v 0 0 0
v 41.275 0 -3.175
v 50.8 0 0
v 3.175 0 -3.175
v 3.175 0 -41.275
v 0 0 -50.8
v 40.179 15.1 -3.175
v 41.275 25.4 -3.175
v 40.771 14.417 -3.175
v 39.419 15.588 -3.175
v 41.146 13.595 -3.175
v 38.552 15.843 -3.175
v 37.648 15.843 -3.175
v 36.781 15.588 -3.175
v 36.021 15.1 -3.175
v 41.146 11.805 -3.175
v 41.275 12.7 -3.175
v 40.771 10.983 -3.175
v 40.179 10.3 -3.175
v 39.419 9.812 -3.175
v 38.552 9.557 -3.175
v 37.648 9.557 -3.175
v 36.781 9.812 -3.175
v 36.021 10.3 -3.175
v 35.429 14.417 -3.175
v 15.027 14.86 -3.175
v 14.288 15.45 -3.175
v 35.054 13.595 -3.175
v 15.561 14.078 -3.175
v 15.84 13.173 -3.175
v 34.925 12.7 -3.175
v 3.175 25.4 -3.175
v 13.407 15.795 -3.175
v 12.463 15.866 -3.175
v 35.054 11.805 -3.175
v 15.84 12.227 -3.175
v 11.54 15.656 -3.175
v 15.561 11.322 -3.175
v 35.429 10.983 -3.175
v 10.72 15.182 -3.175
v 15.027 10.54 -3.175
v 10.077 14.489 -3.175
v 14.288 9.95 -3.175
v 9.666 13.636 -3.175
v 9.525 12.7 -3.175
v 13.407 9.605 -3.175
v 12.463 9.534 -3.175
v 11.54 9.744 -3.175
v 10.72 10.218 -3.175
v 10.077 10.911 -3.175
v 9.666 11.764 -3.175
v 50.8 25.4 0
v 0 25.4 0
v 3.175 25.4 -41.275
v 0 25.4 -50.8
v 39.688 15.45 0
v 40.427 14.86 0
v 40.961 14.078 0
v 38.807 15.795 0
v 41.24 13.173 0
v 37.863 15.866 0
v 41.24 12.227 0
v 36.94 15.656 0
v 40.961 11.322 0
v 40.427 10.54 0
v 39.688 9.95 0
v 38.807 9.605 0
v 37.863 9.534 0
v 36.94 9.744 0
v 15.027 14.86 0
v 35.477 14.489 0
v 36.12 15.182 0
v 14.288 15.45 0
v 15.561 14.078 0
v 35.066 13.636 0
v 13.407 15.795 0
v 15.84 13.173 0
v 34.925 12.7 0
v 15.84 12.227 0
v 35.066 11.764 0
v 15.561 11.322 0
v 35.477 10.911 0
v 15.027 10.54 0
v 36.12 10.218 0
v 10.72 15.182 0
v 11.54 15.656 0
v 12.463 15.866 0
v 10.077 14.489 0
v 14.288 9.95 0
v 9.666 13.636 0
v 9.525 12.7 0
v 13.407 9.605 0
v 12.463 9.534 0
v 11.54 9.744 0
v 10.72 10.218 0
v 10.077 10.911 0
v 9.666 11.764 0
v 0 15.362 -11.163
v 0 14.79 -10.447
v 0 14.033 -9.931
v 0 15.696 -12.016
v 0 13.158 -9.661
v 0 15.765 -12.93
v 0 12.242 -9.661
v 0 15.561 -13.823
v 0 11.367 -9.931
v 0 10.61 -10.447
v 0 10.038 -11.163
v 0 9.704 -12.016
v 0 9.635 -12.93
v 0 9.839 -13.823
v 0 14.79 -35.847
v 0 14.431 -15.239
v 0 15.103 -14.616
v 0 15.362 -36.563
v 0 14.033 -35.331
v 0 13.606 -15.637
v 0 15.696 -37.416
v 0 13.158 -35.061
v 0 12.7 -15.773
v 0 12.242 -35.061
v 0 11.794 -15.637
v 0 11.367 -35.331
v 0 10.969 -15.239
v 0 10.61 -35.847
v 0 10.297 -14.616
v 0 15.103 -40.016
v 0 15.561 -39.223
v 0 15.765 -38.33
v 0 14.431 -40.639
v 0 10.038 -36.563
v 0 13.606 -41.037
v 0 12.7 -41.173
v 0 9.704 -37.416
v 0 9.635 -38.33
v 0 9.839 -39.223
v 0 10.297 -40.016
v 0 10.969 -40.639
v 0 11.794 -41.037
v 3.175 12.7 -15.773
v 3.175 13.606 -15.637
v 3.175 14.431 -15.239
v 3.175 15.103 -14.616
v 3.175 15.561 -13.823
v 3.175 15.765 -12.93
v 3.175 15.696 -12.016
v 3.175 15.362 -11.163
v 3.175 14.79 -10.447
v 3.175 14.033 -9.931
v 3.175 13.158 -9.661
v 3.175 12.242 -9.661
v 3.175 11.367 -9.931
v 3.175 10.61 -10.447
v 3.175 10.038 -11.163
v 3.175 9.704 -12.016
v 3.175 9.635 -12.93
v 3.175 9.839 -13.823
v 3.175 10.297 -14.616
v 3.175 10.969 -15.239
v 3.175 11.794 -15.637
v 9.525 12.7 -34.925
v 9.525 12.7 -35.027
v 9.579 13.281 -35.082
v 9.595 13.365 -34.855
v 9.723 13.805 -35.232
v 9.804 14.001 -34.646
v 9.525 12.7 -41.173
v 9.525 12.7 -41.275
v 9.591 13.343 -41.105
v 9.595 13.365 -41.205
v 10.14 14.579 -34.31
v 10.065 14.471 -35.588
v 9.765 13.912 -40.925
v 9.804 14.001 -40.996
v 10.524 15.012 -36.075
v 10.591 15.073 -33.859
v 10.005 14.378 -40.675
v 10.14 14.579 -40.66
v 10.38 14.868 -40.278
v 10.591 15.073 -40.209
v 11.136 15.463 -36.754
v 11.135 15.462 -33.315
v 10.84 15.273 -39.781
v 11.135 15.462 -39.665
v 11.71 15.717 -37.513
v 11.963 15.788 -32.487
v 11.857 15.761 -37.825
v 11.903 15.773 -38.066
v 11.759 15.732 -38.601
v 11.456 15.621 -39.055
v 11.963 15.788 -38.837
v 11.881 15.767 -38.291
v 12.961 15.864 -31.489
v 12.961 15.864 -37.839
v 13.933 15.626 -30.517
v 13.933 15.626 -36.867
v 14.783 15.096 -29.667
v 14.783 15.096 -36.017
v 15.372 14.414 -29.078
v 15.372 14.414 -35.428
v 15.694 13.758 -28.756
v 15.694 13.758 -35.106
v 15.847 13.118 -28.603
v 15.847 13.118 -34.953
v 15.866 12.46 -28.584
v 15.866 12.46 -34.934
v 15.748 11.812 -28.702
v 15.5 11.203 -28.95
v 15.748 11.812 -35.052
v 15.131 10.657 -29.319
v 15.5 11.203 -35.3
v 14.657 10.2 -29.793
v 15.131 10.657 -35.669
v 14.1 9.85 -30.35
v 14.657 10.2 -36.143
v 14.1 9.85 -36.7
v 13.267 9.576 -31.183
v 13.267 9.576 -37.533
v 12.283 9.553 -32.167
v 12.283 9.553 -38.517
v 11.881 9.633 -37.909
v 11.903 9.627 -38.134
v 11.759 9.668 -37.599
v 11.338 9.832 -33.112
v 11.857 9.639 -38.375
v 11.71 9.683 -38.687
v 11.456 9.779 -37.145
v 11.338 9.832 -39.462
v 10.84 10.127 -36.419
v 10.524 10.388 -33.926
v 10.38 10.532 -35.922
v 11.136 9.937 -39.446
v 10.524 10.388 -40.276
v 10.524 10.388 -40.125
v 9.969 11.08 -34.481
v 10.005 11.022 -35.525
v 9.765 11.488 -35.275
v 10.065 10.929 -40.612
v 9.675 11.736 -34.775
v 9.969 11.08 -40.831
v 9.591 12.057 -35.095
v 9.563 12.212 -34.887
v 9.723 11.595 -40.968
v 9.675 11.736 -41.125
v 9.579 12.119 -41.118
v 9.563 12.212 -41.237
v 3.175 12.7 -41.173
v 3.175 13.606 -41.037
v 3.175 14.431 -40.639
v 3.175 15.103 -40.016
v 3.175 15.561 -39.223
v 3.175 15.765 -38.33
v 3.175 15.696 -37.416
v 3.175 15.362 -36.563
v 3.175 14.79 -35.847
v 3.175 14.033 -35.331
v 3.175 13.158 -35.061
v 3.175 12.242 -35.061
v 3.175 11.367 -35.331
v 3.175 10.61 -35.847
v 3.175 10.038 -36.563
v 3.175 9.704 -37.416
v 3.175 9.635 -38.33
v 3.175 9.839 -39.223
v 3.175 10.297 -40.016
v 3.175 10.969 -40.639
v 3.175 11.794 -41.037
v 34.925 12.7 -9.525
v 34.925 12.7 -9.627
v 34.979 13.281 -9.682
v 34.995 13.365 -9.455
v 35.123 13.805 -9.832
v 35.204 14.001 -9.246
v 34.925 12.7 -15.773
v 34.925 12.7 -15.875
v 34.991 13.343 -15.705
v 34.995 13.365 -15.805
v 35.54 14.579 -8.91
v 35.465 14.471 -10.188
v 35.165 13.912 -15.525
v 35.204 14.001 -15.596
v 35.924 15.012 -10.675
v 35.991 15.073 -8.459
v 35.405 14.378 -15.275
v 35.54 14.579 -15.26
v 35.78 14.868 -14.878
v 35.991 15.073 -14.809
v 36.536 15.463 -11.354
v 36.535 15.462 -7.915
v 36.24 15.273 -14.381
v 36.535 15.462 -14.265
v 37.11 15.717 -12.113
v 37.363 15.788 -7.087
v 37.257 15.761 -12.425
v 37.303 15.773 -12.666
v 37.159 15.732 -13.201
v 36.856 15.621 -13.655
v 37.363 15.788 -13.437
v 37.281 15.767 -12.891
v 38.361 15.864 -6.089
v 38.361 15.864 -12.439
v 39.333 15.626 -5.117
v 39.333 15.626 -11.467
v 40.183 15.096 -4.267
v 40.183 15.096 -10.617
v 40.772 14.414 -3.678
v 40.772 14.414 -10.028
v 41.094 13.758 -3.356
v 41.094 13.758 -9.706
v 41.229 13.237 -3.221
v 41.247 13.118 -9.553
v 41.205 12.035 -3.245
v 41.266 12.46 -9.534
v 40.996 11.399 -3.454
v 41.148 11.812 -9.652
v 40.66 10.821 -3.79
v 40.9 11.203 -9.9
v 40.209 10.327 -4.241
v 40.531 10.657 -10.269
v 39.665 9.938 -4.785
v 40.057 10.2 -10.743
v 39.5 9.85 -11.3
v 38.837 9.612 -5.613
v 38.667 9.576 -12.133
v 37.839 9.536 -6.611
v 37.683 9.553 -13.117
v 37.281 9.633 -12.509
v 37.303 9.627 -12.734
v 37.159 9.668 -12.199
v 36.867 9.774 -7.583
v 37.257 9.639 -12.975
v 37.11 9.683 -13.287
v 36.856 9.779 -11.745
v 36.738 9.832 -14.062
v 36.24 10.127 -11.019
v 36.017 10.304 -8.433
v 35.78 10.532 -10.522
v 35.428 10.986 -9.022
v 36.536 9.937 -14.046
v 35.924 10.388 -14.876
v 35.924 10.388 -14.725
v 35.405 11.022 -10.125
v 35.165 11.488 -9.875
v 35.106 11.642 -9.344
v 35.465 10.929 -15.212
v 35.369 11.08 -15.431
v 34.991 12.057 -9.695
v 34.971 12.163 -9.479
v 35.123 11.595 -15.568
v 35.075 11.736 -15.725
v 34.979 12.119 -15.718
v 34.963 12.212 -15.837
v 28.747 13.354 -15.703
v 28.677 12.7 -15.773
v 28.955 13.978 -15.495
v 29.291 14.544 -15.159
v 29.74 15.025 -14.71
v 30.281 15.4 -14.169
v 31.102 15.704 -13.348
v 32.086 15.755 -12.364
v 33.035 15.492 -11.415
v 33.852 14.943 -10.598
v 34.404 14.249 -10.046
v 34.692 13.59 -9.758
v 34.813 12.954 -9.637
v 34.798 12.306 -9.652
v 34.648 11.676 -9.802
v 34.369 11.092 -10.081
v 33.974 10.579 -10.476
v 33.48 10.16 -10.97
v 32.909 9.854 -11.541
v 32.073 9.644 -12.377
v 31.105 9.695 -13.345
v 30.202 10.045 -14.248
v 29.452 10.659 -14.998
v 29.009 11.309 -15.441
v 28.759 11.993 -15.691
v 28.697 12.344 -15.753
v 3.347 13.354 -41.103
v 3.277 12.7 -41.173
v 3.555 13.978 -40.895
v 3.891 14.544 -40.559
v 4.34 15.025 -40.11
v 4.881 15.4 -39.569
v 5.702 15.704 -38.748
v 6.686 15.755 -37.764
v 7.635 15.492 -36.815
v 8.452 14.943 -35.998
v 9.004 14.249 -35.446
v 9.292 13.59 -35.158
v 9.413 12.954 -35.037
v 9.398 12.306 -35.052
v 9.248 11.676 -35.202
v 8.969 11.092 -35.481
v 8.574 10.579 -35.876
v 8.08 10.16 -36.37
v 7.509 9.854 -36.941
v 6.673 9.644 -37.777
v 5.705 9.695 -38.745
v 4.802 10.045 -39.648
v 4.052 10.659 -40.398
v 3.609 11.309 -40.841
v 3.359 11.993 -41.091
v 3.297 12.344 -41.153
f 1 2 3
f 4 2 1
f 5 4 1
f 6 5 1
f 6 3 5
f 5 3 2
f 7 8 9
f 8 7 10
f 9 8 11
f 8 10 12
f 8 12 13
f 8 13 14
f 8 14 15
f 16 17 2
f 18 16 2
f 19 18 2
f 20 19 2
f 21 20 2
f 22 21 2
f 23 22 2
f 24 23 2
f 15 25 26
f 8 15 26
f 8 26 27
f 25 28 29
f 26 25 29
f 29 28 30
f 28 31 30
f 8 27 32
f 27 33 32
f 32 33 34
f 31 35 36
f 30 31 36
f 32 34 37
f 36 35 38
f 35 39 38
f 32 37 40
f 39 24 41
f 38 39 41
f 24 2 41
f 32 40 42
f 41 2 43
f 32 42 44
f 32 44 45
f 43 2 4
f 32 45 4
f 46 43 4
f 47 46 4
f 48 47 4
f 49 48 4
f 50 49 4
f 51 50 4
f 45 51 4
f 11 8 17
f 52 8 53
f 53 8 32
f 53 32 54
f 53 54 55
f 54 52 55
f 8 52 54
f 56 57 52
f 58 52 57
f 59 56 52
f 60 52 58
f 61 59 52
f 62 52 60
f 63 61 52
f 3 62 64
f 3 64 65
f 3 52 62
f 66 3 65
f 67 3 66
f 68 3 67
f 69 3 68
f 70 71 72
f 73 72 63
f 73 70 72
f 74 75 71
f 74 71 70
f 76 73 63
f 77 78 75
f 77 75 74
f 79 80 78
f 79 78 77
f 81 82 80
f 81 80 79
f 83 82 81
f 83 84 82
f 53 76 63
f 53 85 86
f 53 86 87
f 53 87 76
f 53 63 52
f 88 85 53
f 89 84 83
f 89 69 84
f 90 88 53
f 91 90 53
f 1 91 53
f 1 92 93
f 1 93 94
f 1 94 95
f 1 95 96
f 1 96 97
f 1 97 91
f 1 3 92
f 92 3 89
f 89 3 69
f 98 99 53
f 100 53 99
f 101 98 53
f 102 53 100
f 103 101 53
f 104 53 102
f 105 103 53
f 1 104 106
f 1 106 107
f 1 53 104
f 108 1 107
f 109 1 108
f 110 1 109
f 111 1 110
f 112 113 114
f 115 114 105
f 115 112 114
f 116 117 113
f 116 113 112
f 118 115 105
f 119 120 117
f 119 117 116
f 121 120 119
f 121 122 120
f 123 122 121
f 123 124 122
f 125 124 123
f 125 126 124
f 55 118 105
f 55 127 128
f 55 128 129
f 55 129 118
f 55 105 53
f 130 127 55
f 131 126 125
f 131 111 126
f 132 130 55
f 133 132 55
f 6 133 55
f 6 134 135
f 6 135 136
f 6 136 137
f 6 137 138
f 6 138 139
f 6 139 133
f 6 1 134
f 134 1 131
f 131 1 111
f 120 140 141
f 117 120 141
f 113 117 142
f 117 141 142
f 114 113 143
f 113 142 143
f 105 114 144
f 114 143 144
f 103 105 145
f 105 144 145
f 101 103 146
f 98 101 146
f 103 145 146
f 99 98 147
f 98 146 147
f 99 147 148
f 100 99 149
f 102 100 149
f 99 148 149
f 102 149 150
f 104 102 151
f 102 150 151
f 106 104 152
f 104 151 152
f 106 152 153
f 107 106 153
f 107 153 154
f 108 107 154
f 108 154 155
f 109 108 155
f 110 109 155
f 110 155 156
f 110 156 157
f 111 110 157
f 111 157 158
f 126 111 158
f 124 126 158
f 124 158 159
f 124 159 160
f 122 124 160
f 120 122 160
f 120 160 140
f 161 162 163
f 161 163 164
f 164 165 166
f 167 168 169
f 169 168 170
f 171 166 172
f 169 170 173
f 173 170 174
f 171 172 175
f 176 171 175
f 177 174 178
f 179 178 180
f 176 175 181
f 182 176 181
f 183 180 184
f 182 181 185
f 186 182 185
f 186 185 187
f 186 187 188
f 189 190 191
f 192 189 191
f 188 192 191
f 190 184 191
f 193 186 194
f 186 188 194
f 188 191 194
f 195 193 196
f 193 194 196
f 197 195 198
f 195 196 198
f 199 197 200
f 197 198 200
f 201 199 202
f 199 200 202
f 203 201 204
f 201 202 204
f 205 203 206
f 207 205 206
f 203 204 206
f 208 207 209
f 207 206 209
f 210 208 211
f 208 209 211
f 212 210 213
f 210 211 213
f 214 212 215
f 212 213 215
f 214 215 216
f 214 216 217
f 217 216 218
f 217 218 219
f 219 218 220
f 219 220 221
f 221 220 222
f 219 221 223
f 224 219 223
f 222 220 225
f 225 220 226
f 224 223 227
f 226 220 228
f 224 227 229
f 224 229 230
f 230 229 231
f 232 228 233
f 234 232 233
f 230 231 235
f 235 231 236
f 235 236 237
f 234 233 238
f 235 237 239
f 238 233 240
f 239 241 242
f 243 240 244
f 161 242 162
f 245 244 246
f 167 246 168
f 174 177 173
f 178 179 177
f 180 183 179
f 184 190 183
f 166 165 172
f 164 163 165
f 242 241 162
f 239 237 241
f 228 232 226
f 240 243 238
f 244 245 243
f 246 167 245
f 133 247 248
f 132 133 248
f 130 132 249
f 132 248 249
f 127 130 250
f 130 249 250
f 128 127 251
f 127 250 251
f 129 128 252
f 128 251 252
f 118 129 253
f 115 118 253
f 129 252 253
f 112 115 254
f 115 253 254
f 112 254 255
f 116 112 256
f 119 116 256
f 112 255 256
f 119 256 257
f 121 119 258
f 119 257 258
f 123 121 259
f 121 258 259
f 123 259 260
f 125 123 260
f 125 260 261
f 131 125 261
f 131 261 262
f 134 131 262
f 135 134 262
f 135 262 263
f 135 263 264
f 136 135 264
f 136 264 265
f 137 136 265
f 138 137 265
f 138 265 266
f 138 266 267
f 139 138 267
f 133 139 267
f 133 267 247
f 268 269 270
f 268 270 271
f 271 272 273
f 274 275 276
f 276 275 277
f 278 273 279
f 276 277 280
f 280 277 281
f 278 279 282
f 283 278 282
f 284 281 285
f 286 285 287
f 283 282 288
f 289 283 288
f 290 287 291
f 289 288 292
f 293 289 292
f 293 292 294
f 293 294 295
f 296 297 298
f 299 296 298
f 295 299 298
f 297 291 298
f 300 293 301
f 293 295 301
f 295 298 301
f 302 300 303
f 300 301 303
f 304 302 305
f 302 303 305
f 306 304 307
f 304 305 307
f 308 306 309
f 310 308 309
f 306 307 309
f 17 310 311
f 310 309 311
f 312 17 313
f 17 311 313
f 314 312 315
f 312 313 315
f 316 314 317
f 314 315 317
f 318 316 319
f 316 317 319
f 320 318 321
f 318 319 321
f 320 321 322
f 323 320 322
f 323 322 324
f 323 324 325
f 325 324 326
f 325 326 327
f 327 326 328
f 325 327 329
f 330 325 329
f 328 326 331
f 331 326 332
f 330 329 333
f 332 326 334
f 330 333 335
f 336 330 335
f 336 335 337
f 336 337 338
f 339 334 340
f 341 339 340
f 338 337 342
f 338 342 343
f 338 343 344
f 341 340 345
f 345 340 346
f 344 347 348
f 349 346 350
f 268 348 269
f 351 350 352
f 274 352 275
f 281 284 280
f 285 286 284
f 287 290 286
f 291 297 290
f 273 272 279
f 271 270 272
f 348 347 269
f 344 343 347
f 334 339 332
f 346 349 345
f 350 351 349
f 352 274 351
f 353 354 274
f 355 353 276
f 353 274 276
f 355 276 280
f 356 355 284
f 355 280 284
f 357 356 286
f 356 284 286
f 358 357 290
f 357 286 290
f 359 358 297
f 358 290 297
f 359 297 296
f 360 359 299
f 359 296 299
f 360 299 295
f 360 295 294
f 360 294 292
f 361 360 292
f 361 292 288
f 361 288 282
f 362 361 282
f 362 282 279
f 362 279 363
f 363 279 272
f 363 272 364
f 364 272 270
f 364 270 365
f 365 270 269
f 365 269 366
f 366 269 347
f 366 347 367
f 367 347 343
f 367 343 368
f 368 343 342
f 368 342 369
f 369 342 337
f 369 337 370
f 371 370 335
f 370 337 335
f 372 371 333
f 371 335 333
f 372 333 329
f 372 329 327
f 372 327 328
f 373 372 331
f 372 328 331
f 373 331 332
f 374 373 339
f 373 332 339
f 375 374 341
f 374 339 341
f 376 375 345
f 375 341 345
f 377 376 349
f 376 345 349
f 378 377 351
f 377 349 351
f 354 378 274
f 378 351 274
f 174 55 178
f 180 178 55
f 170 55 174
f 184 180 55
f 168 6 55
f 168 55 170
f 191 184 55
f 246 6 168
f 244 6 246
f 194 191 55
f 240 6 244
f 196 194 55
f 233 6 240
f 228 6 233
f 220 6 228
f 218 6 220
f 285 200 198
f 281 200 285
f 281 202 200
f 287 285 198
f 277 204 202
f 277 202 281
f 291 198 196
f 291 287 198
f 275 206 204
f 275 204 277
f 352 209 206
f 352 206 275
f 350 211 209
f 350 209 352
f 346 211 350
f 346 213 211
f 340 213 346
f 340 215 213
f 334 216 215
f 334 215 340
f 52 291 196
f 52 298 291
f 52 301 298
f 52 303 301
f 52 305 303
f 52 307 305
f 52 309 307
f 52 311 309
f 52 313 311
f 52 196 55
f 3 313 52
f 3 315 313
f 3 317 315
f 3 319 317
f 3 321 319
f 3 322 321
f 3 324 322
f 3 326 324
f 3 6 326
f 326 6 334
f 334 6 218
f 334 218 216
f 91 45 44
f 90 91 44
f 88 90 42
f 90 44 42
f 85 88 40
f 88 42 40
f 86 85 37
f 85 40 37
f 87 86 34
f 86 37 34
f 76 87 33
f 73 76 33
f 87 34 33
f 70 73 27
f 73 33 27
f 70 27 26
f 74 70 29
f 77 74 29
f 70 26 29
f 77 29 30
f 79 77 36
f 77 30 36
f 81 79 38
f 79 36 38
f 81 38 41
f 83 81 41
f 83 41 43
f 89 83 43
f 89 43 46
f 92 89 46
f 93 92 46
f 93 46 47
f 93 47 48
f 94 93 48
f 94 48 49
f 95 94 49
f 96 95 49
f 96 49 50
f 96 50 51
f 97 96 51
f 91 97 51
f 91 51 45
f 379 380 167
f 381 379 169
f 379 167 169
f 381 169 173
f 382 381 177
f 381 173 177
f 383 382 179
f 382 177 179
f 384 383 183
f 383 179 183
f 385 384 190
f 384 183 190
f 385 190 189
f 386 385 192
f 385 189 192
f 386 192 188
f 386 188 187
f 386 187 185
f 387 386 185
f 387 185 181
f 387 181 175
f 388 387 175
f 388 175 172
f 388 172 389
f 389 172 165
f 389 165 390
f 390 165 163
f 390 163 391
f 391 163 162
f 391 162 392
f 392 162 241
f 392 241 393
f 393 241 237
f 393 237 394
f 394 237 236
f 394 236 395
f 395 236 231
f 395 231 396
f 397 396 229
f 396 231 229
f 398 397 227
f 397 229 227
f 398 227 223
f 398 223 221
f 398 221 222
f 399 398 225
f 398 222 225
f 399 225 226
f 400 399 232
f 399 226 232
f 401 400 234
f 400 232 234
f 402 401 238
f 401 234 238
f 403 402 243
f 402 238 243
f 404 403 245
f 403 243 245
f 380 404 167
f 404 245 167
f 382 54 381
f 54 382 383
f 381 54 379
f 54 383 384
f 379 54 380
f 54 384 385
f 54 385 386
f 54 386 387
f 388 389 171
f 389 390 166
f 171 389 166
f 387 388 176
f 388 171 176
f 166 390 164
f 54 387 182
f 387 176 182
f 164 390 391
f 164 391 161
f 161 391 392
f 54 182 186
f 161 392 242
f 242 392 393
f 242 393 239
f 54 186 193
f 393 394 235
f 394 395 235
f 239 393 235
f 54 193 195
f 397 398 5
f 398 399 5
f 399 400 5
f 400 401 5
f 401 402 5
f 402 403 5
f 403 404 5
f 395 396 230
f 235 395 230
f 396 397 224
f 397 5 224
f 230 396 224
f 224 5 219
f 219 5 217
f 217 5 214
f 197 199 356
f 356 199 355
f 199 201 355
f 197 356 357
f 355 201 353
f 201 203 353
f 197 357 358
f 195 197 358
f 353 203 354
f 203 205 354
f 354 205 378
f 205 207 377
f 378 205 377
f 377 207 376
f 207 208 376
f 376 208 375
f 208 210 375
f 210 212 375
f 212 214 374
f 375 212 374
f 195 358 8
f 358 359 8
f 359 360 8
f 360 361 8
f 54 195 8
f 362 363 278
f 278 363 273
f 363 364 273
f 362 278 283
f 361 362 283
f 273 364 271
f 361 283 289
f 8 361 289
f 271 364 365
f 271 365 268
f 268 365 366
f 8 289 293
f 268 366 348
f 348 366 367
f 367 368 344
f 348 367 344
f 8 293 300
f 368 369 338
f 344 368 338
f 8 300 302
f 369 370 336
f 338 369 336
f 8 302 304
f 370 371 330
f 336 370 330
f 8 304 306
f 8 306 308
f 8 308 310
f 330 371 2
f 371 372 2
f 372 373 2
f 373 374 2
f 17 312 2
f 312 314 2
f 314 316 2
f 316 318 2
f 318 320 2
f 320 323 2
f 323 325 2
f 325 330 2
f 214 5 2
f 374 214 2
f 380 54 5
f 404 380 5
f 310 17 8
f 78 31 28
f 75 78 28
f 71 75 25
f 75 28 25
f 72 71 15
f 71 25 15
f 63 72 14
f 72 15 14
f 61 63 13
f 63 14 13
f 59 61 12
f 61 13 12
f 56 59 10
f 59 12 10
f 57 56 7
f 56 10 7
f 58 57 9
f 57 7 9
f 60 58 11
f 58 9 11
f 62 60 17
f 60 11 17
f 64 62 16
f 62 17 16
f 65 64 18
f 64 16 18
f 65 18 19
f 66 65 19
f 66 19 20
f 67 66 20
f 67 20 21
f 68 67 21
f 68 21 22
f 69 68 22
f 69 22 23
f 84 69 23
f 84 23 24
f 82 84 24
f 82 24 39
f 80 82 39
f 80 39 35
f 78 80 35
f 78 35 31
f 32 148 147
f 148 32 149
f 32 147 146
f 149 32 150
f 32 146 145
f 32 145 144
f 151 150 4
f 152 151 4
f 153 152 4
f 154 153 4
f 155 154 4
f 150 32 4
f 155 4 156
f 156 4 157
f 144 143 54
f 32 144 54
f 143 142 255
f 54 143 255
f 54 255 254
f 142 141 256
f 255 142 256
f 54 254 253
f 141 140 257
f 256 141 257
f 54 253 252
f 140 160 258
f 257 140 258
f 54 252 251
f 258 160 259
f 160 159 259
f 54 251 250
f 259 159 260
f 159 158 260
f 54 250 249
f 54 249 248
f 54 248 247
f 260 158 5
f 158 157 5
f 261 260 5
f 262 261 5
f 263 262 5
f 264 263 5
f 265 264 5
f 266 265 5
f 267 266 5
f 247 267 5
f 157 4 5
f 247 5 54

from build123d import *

# Parameters (mm, degrees)
BOSS_EXTRUDE1_DEPTH         = 25.4
C_0_242_DIAMETER_HOLE1_D    = 6.1468
F_1_4_0_25_DIAMETER_HOLE1_D = 6.35


with BuildPart() as part:
    # Sketch1 → Boss-Extrude1 (new body)
    with BuildSketch(Plane(origin=(0, 0, 0), x_dir=(1, 0, 0), z_dir=(0, 1, 0))):
        Polygon((0, 0), (0, 50.8), (50.8, 0), align=None)
        Polygon((3.175, 3.175), (3.175, 41.275), (41.275, 3.175), align=None, mode=Mode.SUBTRACT)
    extrude(amount=BOSS_EXTRUDE1_DEPTH)

    # C (0.242) Diameter Hole1 (through all)
    with Locations(Plane.ZY):
        with Locations((-12.7, 12.7), (-38.1, 12.7)):
            Hole(C_0_242_DIAMETER_HOLE1_D / 2)

    # 1/4 (0.25) Diameter Hole1 (through all)
    with Locations(Plane.XY):
        with Locations((38.1, 12.7), (12.7, 12.7)):
            Hole(F_1_4_0_25_DIAMETER_HOLE1_D / 2)


solid = part.part
